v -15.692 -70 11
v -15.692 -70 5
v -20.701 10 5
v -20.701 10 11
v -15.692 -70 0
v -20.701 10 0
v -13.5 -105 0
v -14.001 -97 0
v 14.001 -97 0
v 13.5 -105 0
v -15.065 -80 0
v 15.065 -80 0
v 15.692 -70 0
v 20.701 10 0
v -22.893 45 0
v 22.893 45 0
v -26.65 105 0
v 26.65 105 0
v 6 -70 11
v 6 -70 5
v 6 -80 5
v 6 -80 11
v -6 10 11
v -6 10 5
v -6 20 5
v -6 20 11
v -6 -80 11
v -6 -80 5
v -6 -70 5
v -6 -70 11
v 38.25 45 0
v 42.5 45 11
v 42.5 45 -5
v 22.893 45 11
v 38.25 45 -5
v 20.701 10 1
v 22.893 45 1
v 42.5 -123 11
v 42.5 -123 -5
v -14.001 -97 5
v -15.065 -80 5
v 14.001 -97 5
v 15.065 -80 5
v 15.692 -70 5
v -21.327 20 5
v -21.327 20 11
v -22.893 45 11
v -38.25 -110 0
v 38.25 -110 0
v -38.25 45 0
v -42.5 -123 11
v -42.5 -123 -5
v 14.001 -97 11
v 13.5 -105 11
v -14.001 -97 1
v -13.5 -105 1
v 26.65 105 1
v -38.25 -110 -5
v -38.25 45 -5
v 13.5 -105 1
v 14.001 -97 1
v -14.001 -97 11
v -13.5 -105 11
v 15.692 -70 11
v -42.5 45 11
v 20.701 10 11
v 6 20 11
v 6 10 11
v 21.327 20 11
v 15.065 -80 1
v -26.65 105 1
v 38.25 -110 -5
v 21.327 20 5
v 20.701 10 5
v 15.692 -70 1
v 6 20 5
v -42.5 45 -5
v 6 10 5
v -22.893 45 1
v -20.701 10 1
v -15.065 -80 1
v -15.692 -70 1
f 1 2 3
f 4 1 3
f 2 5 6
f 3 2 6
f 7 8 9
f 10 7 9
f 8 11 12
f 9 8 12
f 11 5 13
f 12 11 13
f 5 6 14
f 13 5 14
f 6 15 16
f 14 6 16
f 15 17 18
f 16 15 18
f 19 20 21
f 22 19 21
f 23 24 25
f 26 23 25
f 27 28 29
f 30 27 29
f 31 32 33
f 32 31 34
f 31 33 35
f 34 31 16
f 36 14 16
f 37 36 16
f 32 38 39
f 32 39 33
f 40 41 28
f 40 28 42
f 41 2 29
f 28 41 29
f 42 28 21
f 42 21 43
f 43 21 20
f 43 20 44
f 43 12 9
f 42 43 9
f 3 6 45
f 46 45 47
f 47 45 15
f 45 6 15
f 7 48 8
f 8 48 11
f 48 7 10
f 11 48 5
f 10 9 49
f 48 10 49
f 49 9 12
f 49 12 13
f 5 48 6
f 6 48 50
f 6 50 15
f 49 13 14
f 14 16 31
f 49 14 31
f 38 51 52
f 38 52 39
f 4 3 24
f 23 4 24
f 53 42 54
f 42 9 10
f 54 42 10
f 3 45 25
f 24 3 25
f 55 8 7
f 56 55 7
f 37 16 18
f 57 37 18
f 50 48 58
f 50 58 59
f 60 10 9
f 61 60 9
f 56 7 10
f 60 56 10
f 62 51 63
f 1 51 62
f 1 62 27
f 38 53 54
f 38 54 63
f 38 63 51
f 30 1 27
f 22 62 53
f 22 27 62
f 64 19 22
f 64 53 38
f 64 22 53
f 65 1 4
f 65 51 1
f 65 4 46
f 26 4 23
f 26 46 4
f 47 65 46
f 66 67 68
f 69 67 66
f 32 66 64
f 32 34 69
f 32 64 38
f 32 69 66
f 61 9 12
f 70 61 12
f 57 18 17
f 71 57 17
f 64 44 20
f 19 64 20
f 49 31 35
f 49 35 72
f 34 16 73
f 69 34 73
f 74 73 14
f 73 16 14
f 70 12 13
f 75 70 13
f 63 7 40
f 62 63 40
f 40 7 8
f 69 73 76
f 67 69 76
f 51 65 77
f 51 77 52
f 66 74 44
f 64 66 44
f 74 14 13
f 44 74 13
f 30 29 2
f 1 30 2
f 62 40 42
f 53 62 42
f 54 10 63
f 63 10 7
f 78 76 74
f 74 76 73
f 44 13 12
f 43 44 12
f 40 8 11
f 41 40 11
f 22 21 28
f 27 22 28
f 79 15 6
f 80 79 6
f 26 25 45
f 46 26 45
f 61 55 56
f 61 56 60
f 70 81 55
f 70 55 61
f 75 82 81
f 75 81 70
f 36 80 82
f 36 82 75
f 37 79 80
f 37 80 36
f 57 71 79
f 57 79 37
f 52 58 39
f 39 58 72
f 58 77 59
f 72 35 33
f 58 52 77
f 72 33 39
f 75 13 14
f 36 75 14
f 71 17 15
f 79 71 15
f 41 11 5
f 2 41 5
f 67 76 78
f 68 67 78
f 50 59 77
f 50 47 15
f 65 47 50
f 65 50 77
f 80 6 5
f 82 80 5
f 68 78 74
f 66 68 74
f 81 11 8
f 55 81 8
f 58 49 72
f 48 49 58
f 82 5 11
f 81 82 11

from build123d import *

# Parameters (mm, degrees)
F1_DEPTH = 11
F2_START = 5
F2_DEPTH = 6
F3_DEPTH = 5
F4_DEPTH = 1


with BuildPart() as f1:
    # F0 (on Top) → F1 (new body)
    with BuildSketch(Plane.XY):
        Polygon((-38.25, -110), (-38.25, 45), (-42.5, 45), (-42.5, -123), (42.5, -123), (42.5, 45), (38.25, 45), (38.25, -110), align=None)
        Polygon((-21.3273809524, 20), (-22.8928571429, 45), (-38.25, 45), (-38.25, -110), (38.25, -110), (38.25, 45), (22.8928571429, 45), (21.3273809524, 20), (20.7011904762, 10), (15.6916666667, -70), (15.0654761905, -80), (14.000952381, -97), (13.5, -105), (-13.5, -105), (-14.000952381, -97), (-15.0654761905, -80), (-15.6916666667, -70), (-20.7011904762, 10), align=None)
    extrude(amount=F1_DEPTH)

    # F0 (on Top) → F2 (join)
    with BuildSketch(Plane.XY.offset(F2_START)):
        Polygon((20.7011904762, 10), (21.3273809524, 20), (6, 20), (6, 10), align=None)
        Polygon((-6, 20), (-21.3273809524, 20), (-20.7011904762, 10), (-6, 10), align=None)
        Polygon((-6, -70), (-15.6916666667, -70), (-15.0654761905, -80), (-6, -80), align=None)
        Polygon((15.0654761905, -80), (15.6916666667, -70), (6, -70), (6, -80), align=None)
        Polygon((-6, -80), (-15.0654761905, -80), (-14.000952381, -97), (14.000952381, -97), (15.0654761905, -80), (6, -80), align=None)
    extrude(amount=F2_DEPTH)

    # F0 (on Top) → F3 (join)
    with BuildSketch(Plane.XY):
        Polygon((-38.25, -110), (-38.25, 45), (-42.5, 45), (-42.5, -123), (42.5, -123), (42.5, 45), (38.25, 45), (38.25, -110), align=None)
    extrude(amount=-F3_DEPTH)


with BuildPart() as f4:
    # F0 (on Top) → F4 (new body)
    with BuildSketch(Plane.XY):
        Polygon((14.000952381, -97), (-14.000952381, -97), (-13.5, -105), (13.5, -105), align=None)
        Polygon((22.8928571429, 45), (-22.8928571429, 45), (-21.3273809524, 20), (-6, 20), (-6, 10), (-20.7011904762, 10), (-15.6916666667, -70), (-6, -70), (-6, -80), (6, -80), (6, -70), (15.6916666667, -70), (20.7011904762, 10), (6, 10), (6, 20), (21.3273809524, 20), align=None)
        Polygon((15.0654761905, -80), (15.6916666667, -70), (6, -70), (6, -80), align=None)
        Polygon((26.65, 105), (-26.65, 105), (-22.8928571429, 45), (22.8928571429, 45), align=None)
        Polygon((20.7011904762, 10), (21.3273809524, 20), (6, 20), (6, 10), align=None)
        Polygon((-6, 20), (-21.3273809524, 20), (-20.7011904762, 10), (-6, 10), align=None)
        Polygon((-6, -70), (-15.6916666667, -70), (-15.0654761905, -80), (-6, -80), align=None)
        Polygon((-6, -80), (-15.0654761905, -80), (-14.000952381, -97), (14.000952381, -97), (15.0654761905, -80), (6, -80), align=None)
    extrude(amount=F4_DEPTH)


solid = Compound([f1.part, f4.part])
